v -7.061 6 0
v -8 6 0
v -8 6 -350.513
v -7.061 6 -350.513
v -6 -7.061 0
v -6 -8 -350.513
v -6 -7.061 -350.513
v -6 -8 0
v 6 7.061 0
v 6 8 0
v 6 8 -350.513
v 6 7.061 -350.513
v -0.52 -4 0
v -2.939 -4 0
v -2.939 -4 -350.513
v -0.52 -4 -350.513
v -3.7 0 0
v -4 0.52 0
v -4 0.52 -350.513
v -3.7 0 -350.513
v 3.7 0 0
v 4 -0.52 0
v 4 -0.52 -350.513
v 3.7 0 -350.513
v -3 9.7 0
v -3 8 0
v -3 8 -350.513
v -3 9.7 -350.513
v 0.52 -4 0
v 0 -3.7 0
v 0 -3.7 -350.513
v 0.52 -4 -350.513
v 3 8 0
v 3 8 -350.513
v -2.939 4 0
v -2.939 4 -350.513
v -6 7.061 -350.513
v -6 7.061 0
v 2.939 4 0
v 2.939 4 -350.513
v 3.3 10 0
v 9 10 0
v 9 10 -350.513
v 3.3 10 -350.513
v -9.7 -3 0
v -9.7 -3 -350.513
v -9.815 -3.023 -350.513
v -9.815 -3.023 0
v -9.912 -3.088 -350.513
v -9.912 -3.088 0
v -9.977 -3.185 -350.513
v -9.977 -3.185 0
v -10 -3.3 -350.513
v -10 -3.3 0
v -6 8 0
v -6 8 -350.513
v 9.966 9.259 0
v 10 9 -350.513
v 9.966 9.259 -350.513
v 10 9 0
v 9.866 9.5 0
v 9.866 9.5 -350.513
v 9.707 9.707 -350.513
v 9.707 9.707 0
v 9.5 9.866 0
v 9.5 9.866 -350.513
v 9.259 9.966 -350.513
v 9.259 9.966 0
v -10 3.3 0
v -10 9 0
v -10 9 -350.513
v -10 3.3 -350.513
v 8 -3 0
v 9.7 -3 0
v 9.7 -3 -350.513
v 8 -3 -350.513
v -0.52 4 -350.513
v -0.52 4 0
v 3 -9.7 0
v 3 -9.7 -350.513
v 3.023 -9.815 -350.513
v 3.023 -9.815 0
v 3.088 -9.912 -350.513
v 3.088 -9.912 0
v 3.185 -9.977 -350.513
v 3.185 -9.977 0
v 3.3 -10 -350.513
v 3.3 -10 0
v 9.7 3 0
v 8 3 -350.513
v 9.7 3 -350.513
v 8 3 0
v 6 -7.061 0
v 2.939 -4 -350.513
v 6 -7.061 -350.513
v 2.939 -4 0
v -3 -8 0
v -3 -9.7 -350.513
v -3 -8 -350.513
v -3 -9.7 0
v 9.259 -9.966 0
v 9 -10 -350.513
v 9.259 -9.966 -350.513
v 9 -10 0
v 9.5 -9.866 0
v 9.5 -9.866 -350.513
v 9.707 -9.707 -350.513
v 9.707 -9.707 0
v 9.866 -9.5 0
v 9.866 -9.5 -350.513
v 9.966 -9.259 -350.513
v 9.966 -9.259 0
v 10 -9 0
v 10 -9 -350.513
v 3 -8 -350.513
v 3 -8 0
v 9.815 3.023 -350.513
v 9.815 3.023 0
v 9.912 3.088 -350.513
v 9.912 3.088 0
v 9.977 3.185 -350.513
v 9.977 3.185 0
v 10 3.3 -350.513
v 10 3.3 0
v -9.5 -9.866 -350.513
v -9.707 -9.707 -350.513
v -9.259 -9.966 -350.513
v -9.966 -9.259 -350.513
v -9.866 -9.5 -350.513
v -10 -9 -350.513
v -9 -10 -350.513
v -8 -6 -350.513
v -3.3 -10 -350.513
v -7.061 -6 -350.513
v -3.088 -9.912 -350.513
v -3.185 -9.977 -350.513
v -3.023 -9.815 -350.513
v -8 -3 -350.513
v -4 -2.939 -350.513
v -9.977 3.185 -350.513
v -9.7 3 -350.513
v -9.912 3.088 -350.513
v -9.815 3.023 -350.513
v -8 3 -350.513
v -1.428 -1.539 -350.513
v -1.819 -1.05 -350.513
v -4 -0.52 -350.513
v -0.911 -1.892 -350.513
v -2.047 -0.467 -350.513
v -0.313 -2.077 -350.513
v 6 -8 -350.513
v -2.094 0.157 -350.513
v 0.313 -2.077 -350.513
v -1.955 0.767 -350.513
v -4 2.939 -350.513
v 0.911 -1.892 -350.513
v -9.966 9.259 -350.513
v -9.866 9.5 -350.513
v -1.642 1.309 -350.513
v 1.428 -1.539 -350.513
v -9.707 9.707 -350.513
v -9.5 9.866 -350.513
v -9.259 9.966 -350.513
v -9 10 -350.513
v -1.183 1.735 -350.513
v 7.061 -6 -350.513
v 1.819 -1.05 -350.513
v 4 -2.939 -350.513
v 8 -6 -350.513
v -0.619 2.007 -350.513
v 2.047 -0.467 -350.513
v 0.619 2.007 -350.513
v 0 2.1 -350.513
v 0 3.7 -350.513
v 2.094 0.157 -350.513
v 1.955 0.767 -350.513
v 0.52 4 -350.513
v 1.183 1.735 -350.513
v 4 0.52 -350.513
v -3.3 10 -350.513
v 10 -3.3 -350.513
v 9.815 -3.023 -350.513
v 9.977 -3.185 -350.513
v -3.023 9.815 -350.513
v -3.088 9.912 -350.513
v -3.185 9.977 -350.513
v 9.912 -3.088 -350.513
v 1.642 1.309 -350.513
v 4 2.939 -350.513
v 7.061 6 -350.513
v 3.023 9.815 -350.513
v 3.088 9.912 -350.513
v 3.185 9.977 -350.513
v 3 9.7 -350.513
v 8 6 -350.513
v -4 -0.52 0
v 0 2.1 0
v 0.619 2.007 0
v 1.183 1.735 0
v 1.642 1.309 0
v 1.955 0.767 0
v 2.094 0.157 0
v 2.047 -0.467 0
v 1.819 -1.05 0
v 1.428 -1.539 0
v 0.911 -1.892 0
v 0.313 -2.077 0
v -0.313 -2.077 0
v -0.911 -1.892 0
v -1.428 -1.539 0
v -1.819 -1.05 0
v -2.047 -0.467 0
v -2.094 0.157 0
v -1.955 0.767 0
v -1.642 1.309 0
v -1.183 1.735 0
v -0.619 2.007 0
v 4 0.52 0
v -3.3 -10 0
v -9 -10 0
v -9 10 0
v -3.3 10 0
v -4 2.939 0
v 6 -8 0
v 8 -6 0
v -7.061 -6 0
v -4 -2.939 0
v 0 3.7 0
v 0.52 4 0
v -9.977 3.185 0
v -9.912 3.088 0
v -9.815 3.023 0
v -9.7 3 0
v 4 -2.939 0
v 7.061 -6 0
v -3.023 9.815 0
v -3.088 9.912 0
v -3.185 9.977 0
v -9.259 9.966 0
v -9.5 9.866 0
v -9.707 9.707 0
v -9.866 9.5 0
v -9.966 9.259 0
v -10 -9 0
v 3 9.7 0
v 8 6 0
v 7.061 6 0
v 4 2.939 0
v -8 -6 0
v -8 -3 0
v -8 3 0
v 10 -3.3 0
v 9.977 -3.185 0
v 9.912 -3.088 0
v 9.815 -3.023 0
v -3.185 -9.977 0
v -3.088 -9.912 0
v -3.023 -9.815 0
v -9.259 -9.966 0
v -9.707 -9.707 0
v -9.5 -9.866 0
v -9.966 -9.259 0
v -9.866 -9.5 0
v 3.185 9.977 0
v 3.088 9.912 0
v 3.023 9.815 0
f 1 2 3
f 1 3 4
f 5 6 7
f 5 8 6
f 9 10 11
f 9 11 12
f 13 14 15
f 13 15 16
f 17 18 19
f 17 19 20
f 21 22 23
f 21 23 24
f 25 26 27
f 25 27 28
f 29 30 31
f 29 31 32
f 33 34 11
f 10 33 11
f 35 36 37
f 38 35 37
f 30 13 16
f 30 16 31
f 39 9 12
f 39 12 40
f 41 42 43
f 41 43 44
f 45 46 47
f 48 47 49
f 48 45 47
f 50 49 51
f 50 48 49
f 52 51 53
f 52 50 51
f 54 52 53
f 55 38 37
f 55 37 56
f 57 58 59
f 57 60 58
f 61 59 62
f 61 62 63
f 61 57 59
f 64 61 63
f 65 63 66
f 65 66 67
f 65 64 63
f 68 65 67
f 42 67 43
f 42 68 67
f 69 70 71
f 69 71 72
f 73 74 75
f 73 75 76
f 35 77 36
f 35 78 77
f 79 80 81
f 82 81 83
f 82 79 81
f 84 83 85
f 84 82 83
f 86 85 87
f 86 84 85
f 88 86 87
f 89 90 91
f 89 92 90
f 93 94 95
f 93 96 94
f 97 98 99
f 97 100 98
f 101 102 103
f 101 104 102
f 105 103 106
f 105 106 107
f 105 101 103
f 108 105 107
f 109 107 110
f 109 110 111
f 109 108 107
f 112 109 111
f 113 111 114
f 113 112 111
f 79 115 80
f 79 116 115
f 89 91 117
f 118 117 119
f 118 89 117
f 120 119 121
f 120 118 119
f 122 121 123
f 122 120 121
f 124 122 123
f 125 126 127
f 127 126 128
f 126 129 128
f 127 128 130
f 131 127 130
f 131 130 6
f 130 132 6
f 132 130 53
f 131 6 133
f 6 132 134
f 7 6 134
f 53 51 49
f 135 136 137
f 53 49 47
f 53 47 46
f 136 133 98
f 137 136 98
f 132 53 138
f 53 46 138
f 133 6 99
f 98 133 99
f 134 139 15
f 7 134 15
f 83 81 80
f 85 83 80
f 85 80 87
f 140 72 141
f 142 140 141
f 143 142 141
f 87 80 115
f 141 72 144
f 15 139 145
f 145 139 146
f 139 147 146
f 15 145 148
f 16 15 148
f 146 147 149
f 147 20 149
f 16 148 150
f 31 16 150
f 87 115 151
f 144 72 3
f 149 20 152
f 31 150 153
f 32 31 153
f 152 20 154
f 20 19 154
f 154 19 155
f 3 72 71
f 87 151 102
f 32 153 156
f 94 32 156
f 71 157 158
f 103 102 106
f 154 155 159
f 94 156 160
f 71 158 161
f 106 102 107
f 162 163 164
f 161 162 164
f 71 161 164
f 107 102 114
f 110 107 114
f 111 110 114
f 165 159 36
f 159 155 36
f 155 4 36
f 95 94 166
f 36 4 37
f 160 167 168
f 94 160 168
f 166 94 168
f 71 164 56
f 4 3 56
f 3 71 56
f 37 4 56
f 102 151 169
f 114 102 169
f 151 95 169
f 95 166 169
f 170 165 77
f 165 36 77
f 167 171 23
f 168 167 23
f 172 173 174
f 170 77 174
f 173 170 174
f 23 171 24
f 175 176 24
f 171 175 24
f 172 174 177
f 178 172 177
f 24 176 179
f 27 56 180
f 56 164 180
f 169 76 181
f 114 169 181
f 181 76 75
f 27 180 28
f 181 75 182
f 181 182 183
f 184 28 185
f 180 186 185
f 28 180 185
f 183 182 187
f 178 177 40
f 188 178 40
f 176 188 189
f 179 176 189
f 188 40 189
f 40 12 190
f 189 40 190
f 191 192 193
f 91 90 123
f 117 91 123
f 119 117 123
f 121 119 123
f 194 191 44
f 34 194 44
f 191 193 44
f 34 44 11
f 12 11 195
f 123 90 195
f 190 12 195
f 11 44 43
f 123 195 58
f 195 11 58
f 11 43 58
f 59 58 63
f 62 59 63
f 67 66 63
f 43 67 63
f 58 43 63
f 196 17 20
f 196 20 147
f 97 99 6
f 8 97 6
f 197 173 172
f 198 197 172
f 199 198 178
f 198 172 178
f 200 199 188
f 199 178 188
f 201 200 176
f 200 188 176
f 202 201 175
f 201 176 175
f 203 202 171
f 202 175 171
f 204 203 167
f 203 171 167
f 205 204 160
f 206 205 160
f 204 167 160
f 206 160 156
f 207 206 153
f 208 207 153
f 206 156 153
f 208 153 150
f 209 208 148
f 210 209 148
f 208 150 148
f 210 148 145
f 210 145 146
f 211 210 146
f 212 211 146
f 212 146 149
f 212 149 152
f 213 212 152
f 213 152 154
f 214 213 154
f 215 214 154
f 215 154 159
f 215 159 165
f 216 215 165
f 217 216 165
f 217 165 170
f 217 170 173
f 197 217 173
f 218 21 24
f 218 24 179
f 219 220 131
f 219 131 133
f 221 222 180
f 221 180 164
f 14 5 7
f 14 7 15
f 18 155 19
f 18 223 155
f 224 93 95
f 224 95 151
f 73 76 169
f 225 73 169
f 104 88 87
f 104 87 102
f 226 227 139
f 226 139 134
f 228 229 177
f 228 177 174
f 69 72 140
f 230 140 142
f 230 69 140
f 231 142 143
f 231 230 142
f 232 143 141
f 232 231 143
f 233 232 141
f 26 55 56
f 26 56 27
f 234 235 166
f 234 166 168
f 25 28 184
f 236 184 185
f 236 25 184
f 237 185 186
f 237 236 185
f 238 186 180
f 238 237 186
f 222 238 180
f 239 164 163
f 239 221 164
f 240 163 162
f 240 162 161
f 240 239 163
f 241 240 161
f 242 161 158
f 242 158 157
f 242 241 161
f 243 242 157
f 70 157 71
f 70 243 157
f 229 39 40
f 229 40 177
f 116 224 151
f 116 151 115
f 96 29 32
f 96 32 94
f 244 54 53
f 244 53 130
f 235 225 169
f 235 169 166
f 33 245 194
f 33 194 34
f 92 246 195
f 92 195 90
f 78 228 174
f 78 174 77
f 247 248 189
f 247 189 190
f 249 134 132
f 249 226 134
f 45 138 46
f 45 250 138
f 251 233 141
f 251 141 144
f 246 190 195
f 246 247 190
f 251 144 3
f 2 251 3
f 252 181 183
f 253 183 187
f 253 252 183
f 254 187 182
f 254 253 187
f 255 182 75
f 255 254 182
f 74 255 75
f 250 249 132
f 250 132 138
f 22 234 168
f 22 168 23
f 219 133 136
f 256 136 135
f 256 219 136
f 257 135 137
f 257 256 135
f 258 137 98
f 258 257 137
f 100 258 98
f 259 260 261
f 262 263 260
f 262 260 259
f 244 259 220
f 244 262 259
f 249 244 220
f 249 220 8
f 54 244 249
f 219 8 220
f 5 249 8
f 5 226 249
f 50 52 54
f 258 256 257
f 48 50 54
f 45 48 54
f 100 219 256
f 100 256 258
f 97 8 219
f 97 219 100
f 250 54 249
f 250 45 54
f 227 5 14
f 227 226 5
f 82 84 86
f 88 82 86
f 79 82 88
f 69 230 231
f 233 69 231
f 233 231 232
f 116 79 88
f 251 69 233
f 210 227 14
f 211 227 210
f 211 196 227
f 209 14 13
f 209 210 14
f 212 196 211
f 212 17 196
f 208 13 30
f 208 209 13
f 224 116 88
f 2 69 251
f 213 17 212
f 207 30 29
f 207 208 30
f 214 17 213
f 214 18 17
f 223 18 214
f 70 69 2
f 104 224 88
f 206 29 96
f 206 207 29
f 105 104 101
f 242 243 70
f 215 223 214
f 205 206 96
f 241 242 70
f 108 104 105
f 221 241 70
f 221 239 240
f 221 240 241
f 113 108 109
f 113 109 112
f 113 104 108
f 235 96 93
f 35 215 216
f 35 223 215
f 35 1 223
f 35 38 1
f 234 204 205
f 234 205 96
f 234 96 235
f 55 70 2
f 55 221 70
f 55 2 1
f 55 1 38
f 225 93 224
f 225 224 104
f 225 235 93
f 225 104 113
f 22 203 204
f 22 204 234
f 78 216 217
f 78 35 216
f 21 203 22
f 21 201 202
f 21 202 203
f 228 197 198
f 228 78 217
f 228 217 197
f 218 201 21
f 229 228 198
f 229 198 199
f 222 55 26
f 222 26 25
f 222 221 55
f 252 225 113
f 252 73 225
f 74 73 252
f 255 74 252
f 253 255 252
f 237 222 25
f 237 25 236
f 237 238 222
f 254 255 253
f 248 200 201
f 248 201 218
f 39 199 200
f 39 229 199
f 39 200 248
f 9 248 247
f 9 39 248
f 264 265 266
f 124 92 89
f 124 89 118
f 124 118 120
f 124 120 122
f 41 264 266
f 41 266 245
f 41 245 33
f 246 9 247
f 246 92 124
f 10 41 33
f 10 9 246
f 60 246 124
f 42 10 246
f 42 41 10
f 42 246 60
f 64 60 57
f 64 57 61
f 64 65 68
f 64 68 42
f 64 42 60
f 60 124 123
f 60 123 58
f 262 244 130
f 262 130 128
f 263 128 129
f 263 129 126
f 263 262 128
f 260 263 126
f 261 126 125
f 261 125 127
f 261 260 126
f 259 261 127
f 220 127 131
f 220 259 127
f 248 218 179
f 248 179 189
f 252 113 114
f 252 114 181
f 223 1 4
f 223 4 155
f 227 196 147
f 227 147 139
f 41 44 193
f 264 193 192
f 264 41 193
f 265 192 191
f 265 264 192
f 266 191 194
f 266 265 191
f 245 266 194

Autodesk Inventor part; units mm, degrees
sketch "Sketch_1" plane through (0, 0, 0) normal (0, 0, 1) x (1, 0, 0)
  line L0 (-10, 9) -> (-10, 3.3)
  arc A0 (-10, 3.3) -> (-9.7, 3) centre (-9.7, 3.3) ccw
  line L1 (-9.7, 3) -> (-8, 3)
  line L2 (-8, 3) -> (-8, 6)
  line L3 (-8, 6) -> (-7.0607, 6)
  line L4 (-7.0607, 6) -> (-4, 2.9393)
  line L5 (-4, 2.9393) -> (-4, 0.5196)
  line L6 (-4, 0.5196) -> (-3.7, 0)
  line L7 (-3.7, 0) -> (-4, -0.5196)
  line L8 (-4, -0.5196) -> (-4, -2.9393)
  line L9 (-4, -2.9393) -> (-7.0607, -6)
  line L10 (-7.0607, -6) -> (-8, -6)
  line L11 (-8, -6) -> (-8, -3)
  line L12 (-8, -3) -> (-9.7, -3)
  arc A1 (-9.7, -3) -> (-10, -3.3) centre (-9.7, -3.3) ccw
  line L13 (-10, -3.3) -> (-10, -9)
  arc A2 (-10, -9) -> (-9, -10) centre (-9, -9) ccw
  line L14 (-9, -10) -> (-3.3, -10)
  arc A3 (-3.3, -10) -> (-3, -9.7) centre (-3.3, -9.7) ccw
  line L15 (-3, -9.7) -> (-3, -8)
  line L16 (-3, -8) -> (-6, -8)
  line L17 (-6, -8) -> (-6, -7.0607)
  line L18 (-6, -7.0607) -> (-2.9393, -4)
  line L19 (-2.9393, -4) -> (-0.5196, -4)
  line L20 (-0.5196, -4) -> (0, -3.7)
  line L21 (0, -3.7) -> (0.5196, -4)
  line L22 (0.5196, -4) -> (2.9393, -4)
  line L23 (2.9393, -4) -> (6, -7.0607)
  line L24 (6, -7.0607) -> (6, -8)
  line L25 (6, -8) -> (3, -8)
  line L26 (3, -8) -> (3, -9.7)
  arc A4 (3, -9.7) -> (3.3, -10) centre (3.3, -9.7) ccw
  line L27 (3.3, -10) -> (9, -10)
  arc A5 (9, -10) -> (10, -9) centre (9, -9) ccw
  line L28 (10, -9) -> (10, -3.3)
  arc A6 (10, -3.3) -> (9.7, -3) centre (9.7, -3.3) ccw
  line L29 (9.7, -3) -> (8, -3)
  line L30 (8, -3) -> (8, -6)
  line L31 (8, -6) -> (7.0606, -6)
  line L32 (7.0606, -6) -> (4, -2.9393)
  line L33 (4, -2.9393) -> (4, -0.5196)
  line L34 (4, -0.5196) -> (3.7, 0)
  line L35 (3.7, 0) -> (4, 0.5196)
  line L36 (4, 0.5196) -> (4, 2.9393)
  line L37 (4, 2.9393) -> (7.0607, 6)
  line L38 (7.0607, 6) -> (8, 6)
  line L39 (8, 6) -> (8, 3)
  line L40 (8, 3) -> (9.7, 3)
  arc A7 (9.7, 3) -> (10, 3.3) centre (9.7, 3.3) ccw
  line L41 (10, 3.3) -> (10, 9)
  arc A8 (10, 9) -> (9, 10) centre (9, 9) ccw
  line L42 (9, 10) -> (3.3, 10)
  arc A9 (3.3, 10) -> (3, 9.7) centre (3.3, 9.7) ccw
  line L43 (3, 9.7) -> (3, 8)
  line L44 (3, 8) -> (6, 8)
  line L45 (6, 8) -> (6, 7.0607)
  line L46 (6, 7.0607) -> (2.9393, 4)
  line L47 (2.9393, 4) -> (0.5196, 4)
  line L48 (0.5196, 4) -> (0, 3.7)
  line L49 (0, 3.7) -> (-0.5196, 4)
  line L50 (-0.5196, 4) -> (-2.9394, 4)
  line L51 (-2.9394, 4) -> (-6, 7.0606)
  line L52 (-6, 7.0606) -> (-6, 8)
  line L53 (-6, 8) -> (-3, 8)
  line L54 (-3, 8) -> (-3, 9.7)
  arc A10 (-3, 9.7) -> (-3.3, 10) centre (-3.3, 9.7) ccw
  line L55 (-3.3, 10) -> (-9, 10)
  arc A11 (-9, 10) -> (-10, 9) centre (-9, 9) ccw
extrude "Extrusion1" add sketch "Sketch_1" against normal blind 350.513
sketch "Sketch_2" plane through (0, 0, 0) normal (1, 0, 0) x (0, 0, -1)
  line L0 (400, 0) -> (0, 0)
  line L1 (0, 0) -> (0, 2.1)
  line L2 (0, 2.1) -> (400, 2.1)
  line L3 (400, 2.1) -> (400, 0)
  line L4 (400, 0) -> (0, 0)
revolve "Revolution1" cut sketch "Sketch_2" angle 360 about axis through (0, 0, -400) along (0, 0, -1)
ref_plane "C1_XY" through (0, 0, 0) normal (0, 0, 1) x (1, 0, 0)
ref_plane "C1_YZ" through (0, 0, 0) normal (1, 0, 0) x (0, 1, 0)
ref_plane "C1_ZX" through (0, 0, 0) normal (0, 1, 0) x (0, 0, 1)
properties part number "2020 extrusion X cross big machine" material "Aluminum 6061"
